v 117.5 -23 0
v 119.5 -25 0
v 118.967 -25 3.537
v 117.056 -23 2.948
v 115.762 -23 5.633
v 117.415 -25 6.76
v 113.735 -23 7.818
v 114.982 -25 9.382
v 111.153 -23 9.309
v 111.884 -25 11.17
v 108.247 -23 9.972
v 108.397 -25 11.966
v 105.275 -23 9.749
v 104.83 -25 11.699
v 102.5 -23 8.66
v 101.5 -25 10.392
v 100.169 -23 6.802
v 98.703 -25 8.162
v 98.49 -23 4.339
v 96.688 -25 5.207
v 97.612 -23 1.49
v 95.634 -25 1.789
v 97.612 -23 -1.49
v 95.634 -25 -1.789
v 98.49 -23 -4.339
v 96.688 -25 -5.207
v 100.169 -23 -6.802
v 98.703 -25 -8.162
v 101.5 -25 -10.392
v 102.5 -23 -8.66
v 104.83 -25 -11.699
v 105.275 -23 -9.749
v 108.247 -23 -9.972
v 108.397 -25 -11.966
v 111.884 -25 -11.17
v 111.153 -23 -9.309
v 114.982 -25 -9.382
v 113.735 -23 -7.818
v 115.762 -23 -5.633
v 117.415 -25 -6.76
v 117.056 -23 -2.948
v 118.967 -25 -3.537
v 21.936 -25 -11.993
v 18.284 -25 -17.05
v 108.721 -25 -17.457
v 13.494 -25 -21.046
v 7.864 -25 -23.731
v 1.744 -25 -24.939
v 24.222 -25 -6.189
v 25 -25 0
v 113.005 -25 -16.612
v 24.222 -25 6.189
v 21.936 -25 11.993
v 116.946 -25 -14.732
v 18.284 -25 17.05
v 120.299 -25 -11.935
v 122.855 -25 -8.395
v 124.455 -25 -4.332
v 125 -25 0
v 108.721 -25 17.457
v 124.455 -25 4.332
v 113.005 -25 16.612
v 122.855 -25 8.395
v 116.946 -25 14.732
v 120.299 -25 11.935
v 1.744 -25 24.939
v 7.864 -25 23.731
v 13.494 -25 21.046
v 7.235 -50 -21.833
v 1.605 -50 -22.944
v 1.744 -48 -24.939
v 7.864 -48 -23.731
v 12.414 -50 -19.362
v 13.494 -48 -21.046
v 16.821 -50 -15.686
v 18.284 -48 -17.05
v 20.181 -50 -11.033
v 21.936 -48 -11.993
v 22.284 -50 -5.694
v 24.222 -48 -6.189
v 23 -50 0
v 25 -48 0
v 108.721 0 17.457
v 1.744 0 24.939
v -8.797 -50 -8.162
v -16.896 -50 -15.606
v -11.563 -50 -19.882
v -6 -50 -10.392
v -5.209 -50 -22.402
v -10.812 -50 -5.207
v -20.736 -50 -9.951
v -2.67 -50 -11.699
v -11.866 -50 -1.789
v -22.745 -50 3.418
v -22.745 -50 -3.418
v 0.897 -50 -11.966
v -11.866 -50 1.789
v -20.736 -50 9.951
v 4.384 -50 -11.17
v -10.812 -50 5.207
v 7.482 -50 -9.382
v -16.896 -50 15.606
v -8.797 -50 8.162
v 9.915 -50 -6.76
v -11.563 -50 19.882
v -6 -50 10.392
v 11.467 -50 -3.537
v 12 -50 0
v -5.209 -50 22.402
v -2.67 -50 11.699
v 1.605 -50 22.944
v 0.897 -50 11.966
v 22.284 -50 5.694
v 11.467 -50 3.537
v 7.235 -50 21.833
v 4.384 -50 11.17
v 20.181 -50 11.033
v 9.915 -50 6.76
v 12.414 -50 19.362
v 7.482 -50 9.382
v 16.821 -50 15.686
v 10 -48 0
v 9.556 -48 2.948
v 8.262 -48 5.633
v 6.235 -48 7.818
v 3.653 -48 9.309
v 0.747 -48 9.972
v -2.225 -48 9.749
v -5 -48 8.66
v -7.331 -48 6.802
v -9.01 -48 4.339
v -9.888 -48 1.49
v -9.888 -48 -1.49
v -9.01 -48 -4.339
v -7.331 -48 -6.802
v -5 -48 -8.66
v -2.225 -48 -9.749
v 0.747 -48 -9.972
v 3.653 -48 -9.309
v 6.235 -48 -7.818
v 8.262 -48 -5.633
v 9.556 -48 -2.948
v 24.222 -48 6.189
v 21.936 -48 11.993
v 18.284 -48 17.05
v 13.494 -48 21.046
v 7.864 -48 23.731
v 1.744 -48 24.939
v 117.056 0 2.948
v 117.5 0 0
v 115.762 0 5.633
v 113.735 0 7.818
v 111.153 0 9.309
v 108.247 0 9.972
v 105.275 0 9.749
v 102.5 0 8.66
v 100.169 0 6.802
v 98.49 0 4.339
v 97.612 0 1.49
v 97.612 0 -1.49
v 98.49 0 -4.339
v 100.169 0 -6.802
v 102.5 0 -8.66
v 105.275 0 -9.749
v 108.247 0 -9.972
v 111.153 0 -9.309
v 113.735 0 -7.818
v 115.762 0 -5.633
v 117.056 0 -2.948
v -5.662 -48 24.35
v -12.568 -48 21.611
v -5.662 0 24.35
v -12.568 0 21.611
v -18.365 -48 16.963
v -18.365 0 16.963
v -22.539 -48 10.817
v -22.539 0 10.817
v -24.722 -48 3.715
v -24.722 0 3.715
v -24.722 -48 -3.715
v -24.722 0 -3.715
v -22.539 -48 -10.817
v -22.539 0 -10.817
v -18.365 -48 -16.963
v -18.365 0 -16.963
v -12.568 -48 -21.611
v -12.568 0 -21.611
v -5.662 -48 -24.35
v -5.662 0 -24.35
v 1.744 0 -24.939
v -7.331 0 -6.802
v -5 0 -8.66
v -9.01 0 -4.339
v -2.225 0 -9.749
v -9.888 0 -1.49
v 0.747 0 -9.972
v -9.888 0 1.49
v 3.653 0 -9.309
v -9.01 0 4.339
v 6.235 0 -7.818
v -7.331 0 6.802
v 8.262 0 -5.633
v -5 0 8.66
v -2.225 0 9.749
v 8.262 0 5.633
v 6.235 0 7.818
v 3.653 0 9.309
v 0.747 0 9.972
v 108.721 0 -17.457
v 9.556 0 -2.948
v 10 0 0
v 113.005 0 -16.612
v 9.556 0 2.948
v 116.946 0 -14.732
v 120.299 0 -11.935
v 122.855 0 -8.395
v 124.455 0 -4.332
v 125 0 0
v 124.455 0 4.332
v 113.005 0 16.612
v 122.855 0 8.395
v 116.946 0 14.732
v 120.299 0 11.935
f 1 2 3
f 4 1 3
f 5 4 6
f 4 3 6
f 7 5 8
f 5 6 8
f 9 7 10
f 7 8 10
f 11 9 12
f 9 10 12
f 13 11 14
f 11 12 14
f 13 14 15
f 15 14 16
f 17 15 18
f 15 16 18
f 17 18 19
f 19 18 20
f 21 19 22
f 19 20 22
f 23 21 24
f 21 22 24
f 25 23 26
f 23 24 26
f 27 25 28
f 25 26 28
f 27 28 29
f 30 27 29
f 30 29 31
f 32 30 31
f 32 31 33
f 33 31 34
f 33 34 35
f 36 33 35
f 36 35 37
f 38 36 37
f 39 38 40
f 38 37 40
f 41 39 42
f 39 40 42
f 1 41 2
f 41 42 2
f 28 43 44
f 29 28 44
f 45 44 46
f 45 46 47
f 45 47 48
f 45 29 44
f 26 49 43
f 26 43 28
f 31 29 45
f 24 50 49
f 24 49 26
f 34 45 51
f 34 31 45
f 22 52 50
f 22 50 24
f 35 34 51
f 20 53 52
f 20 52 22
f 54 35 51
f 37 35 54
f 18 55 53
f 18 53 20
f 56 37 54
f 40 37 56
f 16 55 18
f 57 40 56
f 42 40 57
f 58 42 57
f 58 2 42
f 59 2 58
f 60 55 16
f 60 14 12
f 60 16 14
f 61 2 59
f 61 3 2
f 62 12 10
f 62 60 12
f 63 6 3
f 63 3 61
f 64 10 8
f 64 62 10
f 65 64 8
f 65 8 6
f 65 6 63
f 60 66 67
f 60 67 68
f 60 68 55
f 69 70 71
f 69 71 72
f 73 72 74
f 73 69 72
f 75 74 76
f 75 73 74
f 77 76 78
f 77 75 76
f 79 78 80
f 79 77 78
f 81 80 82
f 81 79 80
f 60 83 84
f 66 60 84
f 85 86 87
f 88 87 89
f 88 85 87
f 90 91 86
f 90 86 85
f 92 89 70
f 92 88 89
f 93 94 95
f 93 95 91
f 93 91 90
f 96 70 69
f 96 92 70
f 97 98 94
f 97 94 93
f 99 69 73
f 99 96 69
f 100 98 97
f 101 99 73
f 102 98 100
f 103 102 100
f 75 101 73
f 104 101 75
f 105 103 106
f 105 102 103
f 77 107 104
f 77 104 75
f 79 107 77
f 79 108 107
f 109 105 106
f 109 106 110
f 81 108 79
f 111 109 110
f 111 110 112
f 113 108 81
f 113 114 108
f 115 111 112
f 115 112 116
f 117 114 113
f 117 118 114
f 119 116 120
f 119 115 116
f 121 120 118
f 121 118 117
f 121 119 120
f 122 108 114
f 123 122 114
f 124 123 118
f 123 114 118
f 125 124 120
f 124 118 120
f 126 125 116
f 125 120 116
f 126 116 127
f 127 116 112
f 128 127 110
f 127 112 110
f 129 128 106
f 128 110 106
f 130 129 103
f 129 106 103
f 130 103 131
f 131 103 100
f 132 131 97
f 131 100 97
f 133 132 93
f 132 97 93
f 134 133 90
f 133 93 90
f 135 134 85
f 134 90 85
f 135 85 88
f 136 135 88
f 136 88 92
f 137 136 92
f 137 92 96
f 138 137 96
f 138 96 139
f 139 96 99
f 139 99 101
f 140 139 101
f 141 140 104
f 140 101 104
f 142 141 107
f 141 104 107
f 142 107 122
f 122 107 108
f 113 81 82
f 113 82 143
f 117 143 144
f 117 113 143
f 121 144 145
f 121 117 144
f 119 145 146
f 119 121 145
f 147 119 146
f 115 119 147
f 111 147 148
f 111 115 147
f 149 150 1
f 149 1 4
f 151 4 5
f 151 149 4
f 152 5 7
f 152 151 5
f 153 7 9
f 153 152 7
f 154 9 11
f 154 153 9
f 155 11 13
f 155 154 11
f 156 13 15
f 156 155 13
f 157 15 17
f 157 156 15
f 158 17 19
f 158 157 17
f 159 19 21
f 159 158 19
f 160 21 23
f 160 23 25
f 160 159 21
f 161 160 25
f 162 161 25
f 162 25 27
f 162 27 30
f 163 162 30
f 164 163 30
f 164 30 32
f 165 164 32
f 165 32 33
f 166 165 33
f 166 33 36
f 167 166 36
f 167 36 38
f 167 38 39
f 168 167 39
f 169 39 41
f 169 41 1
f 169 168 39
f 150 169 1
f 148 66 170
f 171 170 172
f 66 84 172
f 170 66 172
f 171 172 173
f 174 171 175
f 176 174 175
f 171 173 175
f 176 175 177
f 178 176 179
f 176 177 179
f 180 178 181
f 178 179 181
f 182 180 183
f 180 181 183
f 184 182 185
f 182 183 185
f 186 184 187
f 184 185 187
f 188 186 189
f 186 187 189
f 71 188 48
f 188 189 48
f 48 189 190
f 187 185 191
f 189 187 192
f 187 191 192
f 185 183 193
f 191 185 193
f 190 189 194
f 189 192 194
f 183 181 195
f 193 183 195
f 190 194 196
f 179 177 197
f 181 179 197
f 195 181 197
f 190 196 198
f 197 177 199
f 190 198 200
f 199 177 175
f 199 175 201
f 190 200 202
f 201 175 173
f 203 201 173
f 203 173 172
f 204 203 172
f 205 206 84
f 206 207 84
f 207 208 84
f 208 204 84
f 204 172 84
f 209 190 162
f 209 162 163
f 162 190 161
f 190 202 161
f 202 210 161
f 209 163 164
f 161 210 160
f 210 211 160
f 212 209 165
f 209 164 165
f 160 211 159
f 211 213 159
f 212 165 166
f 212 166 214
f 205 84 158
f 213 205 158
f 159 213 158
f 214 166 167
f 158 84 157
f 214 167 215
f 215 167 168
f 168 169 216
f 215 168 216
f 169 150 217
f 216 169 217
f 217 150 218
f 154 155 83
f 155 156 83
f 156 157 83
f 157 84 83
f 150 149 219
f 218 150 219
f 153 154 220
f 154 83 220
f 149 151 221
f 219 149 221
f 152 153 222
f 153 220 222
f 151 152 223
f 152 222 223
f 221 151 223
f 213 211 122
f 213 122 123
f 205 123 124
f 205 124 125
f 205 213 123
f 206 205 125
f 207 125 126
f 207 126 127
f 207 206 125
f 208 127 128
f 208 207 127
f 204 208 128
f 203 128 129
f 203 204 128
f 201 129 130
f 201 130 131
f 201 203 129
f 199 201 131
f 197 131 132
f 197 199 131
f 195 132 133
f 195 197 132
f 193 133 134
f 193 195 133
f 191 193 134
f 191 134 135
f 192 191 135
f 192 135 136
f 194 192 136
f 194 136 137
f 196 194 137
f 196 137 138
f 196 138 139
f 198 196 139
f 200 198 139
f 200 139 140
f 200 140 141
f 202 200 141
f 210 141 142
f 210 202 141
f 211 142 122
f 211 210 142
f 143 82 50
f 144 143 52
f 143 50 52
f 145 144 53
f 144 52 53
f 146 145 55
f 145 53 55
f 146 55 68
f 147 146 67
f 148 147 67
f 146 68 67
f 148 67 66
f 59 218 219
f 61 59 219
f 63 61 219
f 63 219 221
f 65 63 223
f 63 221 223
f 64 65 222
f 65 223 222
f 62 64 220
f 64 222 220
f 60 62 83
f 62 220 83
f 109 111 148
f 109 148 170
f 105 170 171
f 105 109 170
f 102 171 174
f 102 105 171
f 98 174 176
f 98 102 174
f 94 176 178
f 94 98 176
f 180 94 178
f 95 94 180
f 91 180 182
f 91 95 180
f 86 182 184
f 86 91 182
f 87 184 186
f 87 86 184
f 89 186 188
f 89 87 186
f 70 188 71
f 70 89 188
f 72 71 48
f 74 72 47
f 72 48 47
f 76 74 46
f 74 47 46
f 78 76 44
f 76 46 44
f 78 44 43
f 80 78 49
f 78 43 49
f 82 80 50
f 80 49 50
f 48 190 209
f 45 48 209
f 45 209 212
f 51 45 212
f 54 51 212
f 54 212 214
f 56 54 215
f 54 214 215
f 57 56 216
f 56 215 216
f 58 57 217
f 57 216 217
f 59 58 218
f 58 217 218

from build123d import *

# Parameters (mm, degrees)
F0_R     = 10
F1_DEPTH = 25
F2_DEPTH = 50
F3_SIZE  = 2


with BuildPart() as f1:
    # F0 (on Front) → F1 (new body)
    with BuildSketch(Plane.XZ):
        with BuildLine():
            ThreePointArc((1.744186, 24.939082), (18.283936, 17.049858), (25, 0))
            ThreePointArc((25, 0), (18.283936, -17.049858), (1.744186, -24.939082))
            Line((1.744186, -24.939082), (108.72093, -17.457357))
            ThreePointArc((108.72093, -17.457357), (90, 0), (108.72093, 17.457357))
            Line((108.72093, 17.457357), (1.744186, 24.939082))
        make_face()
        with BuildLine():
            ThreePointArc((1.744186, -24.939082), (18.283936, -17.049858), (25, 0))
            ThreePointArc((25, 0), (18.283936, 17.049858), (1.744186, 24.939082))
            ThreePointArc((1.744186, 24.939082), (-25, 0), (1.744186, -24.939082))
        make_face()
        Circle(F0_R, mode=Mode.SUBTRACT)
        with BuildLine():
            ThreePointArc((125, 0), (120.298755, 11.934901), (108.72093, 17.457357))
            ThreePointArc((108.72093, 17.457357), (90, 0), (108.72093, -17.457357))
            ThreePointArc((108.72093, -17.457357), (120.298755, -11.934901), (125, 0))
        make_face()
        with Locations((107.5, 0)):
            Circle(F0_R, mode=Mode.SUBTRACT)
    extrude(amount=F1_DEPTH)

    # F0 (on Front) → F2 (join)
    with BuildSketch(Plane.XZ):
        with BuildLine():
            ThreePointArc((1.744186, -24.939082), (18.283936, -17.049858), (25, 0))
            ThreePointArc((25, 0), (18.283936, 17.049858), (1.744186, 24.939082))
            ThreePointArc((1.744186, 24.939082), (-25, 0), (1.744186, -24.939082))
        make_face()
        Circle(F0_R, mode=Mode.SUBTRACT)
    extrude(amount=F2_DEPTH)

    # F3
    f3_edges = [f1.edges().sort_by_distance(p)[0] for p in [
        (-10, -50, 0),
        (-1.744186, -50, 24.939082),
        (97.5, -25, 0),
    ]]
    chamfer(f3_edges, length=F3_SIZE)


solid = f1.part
